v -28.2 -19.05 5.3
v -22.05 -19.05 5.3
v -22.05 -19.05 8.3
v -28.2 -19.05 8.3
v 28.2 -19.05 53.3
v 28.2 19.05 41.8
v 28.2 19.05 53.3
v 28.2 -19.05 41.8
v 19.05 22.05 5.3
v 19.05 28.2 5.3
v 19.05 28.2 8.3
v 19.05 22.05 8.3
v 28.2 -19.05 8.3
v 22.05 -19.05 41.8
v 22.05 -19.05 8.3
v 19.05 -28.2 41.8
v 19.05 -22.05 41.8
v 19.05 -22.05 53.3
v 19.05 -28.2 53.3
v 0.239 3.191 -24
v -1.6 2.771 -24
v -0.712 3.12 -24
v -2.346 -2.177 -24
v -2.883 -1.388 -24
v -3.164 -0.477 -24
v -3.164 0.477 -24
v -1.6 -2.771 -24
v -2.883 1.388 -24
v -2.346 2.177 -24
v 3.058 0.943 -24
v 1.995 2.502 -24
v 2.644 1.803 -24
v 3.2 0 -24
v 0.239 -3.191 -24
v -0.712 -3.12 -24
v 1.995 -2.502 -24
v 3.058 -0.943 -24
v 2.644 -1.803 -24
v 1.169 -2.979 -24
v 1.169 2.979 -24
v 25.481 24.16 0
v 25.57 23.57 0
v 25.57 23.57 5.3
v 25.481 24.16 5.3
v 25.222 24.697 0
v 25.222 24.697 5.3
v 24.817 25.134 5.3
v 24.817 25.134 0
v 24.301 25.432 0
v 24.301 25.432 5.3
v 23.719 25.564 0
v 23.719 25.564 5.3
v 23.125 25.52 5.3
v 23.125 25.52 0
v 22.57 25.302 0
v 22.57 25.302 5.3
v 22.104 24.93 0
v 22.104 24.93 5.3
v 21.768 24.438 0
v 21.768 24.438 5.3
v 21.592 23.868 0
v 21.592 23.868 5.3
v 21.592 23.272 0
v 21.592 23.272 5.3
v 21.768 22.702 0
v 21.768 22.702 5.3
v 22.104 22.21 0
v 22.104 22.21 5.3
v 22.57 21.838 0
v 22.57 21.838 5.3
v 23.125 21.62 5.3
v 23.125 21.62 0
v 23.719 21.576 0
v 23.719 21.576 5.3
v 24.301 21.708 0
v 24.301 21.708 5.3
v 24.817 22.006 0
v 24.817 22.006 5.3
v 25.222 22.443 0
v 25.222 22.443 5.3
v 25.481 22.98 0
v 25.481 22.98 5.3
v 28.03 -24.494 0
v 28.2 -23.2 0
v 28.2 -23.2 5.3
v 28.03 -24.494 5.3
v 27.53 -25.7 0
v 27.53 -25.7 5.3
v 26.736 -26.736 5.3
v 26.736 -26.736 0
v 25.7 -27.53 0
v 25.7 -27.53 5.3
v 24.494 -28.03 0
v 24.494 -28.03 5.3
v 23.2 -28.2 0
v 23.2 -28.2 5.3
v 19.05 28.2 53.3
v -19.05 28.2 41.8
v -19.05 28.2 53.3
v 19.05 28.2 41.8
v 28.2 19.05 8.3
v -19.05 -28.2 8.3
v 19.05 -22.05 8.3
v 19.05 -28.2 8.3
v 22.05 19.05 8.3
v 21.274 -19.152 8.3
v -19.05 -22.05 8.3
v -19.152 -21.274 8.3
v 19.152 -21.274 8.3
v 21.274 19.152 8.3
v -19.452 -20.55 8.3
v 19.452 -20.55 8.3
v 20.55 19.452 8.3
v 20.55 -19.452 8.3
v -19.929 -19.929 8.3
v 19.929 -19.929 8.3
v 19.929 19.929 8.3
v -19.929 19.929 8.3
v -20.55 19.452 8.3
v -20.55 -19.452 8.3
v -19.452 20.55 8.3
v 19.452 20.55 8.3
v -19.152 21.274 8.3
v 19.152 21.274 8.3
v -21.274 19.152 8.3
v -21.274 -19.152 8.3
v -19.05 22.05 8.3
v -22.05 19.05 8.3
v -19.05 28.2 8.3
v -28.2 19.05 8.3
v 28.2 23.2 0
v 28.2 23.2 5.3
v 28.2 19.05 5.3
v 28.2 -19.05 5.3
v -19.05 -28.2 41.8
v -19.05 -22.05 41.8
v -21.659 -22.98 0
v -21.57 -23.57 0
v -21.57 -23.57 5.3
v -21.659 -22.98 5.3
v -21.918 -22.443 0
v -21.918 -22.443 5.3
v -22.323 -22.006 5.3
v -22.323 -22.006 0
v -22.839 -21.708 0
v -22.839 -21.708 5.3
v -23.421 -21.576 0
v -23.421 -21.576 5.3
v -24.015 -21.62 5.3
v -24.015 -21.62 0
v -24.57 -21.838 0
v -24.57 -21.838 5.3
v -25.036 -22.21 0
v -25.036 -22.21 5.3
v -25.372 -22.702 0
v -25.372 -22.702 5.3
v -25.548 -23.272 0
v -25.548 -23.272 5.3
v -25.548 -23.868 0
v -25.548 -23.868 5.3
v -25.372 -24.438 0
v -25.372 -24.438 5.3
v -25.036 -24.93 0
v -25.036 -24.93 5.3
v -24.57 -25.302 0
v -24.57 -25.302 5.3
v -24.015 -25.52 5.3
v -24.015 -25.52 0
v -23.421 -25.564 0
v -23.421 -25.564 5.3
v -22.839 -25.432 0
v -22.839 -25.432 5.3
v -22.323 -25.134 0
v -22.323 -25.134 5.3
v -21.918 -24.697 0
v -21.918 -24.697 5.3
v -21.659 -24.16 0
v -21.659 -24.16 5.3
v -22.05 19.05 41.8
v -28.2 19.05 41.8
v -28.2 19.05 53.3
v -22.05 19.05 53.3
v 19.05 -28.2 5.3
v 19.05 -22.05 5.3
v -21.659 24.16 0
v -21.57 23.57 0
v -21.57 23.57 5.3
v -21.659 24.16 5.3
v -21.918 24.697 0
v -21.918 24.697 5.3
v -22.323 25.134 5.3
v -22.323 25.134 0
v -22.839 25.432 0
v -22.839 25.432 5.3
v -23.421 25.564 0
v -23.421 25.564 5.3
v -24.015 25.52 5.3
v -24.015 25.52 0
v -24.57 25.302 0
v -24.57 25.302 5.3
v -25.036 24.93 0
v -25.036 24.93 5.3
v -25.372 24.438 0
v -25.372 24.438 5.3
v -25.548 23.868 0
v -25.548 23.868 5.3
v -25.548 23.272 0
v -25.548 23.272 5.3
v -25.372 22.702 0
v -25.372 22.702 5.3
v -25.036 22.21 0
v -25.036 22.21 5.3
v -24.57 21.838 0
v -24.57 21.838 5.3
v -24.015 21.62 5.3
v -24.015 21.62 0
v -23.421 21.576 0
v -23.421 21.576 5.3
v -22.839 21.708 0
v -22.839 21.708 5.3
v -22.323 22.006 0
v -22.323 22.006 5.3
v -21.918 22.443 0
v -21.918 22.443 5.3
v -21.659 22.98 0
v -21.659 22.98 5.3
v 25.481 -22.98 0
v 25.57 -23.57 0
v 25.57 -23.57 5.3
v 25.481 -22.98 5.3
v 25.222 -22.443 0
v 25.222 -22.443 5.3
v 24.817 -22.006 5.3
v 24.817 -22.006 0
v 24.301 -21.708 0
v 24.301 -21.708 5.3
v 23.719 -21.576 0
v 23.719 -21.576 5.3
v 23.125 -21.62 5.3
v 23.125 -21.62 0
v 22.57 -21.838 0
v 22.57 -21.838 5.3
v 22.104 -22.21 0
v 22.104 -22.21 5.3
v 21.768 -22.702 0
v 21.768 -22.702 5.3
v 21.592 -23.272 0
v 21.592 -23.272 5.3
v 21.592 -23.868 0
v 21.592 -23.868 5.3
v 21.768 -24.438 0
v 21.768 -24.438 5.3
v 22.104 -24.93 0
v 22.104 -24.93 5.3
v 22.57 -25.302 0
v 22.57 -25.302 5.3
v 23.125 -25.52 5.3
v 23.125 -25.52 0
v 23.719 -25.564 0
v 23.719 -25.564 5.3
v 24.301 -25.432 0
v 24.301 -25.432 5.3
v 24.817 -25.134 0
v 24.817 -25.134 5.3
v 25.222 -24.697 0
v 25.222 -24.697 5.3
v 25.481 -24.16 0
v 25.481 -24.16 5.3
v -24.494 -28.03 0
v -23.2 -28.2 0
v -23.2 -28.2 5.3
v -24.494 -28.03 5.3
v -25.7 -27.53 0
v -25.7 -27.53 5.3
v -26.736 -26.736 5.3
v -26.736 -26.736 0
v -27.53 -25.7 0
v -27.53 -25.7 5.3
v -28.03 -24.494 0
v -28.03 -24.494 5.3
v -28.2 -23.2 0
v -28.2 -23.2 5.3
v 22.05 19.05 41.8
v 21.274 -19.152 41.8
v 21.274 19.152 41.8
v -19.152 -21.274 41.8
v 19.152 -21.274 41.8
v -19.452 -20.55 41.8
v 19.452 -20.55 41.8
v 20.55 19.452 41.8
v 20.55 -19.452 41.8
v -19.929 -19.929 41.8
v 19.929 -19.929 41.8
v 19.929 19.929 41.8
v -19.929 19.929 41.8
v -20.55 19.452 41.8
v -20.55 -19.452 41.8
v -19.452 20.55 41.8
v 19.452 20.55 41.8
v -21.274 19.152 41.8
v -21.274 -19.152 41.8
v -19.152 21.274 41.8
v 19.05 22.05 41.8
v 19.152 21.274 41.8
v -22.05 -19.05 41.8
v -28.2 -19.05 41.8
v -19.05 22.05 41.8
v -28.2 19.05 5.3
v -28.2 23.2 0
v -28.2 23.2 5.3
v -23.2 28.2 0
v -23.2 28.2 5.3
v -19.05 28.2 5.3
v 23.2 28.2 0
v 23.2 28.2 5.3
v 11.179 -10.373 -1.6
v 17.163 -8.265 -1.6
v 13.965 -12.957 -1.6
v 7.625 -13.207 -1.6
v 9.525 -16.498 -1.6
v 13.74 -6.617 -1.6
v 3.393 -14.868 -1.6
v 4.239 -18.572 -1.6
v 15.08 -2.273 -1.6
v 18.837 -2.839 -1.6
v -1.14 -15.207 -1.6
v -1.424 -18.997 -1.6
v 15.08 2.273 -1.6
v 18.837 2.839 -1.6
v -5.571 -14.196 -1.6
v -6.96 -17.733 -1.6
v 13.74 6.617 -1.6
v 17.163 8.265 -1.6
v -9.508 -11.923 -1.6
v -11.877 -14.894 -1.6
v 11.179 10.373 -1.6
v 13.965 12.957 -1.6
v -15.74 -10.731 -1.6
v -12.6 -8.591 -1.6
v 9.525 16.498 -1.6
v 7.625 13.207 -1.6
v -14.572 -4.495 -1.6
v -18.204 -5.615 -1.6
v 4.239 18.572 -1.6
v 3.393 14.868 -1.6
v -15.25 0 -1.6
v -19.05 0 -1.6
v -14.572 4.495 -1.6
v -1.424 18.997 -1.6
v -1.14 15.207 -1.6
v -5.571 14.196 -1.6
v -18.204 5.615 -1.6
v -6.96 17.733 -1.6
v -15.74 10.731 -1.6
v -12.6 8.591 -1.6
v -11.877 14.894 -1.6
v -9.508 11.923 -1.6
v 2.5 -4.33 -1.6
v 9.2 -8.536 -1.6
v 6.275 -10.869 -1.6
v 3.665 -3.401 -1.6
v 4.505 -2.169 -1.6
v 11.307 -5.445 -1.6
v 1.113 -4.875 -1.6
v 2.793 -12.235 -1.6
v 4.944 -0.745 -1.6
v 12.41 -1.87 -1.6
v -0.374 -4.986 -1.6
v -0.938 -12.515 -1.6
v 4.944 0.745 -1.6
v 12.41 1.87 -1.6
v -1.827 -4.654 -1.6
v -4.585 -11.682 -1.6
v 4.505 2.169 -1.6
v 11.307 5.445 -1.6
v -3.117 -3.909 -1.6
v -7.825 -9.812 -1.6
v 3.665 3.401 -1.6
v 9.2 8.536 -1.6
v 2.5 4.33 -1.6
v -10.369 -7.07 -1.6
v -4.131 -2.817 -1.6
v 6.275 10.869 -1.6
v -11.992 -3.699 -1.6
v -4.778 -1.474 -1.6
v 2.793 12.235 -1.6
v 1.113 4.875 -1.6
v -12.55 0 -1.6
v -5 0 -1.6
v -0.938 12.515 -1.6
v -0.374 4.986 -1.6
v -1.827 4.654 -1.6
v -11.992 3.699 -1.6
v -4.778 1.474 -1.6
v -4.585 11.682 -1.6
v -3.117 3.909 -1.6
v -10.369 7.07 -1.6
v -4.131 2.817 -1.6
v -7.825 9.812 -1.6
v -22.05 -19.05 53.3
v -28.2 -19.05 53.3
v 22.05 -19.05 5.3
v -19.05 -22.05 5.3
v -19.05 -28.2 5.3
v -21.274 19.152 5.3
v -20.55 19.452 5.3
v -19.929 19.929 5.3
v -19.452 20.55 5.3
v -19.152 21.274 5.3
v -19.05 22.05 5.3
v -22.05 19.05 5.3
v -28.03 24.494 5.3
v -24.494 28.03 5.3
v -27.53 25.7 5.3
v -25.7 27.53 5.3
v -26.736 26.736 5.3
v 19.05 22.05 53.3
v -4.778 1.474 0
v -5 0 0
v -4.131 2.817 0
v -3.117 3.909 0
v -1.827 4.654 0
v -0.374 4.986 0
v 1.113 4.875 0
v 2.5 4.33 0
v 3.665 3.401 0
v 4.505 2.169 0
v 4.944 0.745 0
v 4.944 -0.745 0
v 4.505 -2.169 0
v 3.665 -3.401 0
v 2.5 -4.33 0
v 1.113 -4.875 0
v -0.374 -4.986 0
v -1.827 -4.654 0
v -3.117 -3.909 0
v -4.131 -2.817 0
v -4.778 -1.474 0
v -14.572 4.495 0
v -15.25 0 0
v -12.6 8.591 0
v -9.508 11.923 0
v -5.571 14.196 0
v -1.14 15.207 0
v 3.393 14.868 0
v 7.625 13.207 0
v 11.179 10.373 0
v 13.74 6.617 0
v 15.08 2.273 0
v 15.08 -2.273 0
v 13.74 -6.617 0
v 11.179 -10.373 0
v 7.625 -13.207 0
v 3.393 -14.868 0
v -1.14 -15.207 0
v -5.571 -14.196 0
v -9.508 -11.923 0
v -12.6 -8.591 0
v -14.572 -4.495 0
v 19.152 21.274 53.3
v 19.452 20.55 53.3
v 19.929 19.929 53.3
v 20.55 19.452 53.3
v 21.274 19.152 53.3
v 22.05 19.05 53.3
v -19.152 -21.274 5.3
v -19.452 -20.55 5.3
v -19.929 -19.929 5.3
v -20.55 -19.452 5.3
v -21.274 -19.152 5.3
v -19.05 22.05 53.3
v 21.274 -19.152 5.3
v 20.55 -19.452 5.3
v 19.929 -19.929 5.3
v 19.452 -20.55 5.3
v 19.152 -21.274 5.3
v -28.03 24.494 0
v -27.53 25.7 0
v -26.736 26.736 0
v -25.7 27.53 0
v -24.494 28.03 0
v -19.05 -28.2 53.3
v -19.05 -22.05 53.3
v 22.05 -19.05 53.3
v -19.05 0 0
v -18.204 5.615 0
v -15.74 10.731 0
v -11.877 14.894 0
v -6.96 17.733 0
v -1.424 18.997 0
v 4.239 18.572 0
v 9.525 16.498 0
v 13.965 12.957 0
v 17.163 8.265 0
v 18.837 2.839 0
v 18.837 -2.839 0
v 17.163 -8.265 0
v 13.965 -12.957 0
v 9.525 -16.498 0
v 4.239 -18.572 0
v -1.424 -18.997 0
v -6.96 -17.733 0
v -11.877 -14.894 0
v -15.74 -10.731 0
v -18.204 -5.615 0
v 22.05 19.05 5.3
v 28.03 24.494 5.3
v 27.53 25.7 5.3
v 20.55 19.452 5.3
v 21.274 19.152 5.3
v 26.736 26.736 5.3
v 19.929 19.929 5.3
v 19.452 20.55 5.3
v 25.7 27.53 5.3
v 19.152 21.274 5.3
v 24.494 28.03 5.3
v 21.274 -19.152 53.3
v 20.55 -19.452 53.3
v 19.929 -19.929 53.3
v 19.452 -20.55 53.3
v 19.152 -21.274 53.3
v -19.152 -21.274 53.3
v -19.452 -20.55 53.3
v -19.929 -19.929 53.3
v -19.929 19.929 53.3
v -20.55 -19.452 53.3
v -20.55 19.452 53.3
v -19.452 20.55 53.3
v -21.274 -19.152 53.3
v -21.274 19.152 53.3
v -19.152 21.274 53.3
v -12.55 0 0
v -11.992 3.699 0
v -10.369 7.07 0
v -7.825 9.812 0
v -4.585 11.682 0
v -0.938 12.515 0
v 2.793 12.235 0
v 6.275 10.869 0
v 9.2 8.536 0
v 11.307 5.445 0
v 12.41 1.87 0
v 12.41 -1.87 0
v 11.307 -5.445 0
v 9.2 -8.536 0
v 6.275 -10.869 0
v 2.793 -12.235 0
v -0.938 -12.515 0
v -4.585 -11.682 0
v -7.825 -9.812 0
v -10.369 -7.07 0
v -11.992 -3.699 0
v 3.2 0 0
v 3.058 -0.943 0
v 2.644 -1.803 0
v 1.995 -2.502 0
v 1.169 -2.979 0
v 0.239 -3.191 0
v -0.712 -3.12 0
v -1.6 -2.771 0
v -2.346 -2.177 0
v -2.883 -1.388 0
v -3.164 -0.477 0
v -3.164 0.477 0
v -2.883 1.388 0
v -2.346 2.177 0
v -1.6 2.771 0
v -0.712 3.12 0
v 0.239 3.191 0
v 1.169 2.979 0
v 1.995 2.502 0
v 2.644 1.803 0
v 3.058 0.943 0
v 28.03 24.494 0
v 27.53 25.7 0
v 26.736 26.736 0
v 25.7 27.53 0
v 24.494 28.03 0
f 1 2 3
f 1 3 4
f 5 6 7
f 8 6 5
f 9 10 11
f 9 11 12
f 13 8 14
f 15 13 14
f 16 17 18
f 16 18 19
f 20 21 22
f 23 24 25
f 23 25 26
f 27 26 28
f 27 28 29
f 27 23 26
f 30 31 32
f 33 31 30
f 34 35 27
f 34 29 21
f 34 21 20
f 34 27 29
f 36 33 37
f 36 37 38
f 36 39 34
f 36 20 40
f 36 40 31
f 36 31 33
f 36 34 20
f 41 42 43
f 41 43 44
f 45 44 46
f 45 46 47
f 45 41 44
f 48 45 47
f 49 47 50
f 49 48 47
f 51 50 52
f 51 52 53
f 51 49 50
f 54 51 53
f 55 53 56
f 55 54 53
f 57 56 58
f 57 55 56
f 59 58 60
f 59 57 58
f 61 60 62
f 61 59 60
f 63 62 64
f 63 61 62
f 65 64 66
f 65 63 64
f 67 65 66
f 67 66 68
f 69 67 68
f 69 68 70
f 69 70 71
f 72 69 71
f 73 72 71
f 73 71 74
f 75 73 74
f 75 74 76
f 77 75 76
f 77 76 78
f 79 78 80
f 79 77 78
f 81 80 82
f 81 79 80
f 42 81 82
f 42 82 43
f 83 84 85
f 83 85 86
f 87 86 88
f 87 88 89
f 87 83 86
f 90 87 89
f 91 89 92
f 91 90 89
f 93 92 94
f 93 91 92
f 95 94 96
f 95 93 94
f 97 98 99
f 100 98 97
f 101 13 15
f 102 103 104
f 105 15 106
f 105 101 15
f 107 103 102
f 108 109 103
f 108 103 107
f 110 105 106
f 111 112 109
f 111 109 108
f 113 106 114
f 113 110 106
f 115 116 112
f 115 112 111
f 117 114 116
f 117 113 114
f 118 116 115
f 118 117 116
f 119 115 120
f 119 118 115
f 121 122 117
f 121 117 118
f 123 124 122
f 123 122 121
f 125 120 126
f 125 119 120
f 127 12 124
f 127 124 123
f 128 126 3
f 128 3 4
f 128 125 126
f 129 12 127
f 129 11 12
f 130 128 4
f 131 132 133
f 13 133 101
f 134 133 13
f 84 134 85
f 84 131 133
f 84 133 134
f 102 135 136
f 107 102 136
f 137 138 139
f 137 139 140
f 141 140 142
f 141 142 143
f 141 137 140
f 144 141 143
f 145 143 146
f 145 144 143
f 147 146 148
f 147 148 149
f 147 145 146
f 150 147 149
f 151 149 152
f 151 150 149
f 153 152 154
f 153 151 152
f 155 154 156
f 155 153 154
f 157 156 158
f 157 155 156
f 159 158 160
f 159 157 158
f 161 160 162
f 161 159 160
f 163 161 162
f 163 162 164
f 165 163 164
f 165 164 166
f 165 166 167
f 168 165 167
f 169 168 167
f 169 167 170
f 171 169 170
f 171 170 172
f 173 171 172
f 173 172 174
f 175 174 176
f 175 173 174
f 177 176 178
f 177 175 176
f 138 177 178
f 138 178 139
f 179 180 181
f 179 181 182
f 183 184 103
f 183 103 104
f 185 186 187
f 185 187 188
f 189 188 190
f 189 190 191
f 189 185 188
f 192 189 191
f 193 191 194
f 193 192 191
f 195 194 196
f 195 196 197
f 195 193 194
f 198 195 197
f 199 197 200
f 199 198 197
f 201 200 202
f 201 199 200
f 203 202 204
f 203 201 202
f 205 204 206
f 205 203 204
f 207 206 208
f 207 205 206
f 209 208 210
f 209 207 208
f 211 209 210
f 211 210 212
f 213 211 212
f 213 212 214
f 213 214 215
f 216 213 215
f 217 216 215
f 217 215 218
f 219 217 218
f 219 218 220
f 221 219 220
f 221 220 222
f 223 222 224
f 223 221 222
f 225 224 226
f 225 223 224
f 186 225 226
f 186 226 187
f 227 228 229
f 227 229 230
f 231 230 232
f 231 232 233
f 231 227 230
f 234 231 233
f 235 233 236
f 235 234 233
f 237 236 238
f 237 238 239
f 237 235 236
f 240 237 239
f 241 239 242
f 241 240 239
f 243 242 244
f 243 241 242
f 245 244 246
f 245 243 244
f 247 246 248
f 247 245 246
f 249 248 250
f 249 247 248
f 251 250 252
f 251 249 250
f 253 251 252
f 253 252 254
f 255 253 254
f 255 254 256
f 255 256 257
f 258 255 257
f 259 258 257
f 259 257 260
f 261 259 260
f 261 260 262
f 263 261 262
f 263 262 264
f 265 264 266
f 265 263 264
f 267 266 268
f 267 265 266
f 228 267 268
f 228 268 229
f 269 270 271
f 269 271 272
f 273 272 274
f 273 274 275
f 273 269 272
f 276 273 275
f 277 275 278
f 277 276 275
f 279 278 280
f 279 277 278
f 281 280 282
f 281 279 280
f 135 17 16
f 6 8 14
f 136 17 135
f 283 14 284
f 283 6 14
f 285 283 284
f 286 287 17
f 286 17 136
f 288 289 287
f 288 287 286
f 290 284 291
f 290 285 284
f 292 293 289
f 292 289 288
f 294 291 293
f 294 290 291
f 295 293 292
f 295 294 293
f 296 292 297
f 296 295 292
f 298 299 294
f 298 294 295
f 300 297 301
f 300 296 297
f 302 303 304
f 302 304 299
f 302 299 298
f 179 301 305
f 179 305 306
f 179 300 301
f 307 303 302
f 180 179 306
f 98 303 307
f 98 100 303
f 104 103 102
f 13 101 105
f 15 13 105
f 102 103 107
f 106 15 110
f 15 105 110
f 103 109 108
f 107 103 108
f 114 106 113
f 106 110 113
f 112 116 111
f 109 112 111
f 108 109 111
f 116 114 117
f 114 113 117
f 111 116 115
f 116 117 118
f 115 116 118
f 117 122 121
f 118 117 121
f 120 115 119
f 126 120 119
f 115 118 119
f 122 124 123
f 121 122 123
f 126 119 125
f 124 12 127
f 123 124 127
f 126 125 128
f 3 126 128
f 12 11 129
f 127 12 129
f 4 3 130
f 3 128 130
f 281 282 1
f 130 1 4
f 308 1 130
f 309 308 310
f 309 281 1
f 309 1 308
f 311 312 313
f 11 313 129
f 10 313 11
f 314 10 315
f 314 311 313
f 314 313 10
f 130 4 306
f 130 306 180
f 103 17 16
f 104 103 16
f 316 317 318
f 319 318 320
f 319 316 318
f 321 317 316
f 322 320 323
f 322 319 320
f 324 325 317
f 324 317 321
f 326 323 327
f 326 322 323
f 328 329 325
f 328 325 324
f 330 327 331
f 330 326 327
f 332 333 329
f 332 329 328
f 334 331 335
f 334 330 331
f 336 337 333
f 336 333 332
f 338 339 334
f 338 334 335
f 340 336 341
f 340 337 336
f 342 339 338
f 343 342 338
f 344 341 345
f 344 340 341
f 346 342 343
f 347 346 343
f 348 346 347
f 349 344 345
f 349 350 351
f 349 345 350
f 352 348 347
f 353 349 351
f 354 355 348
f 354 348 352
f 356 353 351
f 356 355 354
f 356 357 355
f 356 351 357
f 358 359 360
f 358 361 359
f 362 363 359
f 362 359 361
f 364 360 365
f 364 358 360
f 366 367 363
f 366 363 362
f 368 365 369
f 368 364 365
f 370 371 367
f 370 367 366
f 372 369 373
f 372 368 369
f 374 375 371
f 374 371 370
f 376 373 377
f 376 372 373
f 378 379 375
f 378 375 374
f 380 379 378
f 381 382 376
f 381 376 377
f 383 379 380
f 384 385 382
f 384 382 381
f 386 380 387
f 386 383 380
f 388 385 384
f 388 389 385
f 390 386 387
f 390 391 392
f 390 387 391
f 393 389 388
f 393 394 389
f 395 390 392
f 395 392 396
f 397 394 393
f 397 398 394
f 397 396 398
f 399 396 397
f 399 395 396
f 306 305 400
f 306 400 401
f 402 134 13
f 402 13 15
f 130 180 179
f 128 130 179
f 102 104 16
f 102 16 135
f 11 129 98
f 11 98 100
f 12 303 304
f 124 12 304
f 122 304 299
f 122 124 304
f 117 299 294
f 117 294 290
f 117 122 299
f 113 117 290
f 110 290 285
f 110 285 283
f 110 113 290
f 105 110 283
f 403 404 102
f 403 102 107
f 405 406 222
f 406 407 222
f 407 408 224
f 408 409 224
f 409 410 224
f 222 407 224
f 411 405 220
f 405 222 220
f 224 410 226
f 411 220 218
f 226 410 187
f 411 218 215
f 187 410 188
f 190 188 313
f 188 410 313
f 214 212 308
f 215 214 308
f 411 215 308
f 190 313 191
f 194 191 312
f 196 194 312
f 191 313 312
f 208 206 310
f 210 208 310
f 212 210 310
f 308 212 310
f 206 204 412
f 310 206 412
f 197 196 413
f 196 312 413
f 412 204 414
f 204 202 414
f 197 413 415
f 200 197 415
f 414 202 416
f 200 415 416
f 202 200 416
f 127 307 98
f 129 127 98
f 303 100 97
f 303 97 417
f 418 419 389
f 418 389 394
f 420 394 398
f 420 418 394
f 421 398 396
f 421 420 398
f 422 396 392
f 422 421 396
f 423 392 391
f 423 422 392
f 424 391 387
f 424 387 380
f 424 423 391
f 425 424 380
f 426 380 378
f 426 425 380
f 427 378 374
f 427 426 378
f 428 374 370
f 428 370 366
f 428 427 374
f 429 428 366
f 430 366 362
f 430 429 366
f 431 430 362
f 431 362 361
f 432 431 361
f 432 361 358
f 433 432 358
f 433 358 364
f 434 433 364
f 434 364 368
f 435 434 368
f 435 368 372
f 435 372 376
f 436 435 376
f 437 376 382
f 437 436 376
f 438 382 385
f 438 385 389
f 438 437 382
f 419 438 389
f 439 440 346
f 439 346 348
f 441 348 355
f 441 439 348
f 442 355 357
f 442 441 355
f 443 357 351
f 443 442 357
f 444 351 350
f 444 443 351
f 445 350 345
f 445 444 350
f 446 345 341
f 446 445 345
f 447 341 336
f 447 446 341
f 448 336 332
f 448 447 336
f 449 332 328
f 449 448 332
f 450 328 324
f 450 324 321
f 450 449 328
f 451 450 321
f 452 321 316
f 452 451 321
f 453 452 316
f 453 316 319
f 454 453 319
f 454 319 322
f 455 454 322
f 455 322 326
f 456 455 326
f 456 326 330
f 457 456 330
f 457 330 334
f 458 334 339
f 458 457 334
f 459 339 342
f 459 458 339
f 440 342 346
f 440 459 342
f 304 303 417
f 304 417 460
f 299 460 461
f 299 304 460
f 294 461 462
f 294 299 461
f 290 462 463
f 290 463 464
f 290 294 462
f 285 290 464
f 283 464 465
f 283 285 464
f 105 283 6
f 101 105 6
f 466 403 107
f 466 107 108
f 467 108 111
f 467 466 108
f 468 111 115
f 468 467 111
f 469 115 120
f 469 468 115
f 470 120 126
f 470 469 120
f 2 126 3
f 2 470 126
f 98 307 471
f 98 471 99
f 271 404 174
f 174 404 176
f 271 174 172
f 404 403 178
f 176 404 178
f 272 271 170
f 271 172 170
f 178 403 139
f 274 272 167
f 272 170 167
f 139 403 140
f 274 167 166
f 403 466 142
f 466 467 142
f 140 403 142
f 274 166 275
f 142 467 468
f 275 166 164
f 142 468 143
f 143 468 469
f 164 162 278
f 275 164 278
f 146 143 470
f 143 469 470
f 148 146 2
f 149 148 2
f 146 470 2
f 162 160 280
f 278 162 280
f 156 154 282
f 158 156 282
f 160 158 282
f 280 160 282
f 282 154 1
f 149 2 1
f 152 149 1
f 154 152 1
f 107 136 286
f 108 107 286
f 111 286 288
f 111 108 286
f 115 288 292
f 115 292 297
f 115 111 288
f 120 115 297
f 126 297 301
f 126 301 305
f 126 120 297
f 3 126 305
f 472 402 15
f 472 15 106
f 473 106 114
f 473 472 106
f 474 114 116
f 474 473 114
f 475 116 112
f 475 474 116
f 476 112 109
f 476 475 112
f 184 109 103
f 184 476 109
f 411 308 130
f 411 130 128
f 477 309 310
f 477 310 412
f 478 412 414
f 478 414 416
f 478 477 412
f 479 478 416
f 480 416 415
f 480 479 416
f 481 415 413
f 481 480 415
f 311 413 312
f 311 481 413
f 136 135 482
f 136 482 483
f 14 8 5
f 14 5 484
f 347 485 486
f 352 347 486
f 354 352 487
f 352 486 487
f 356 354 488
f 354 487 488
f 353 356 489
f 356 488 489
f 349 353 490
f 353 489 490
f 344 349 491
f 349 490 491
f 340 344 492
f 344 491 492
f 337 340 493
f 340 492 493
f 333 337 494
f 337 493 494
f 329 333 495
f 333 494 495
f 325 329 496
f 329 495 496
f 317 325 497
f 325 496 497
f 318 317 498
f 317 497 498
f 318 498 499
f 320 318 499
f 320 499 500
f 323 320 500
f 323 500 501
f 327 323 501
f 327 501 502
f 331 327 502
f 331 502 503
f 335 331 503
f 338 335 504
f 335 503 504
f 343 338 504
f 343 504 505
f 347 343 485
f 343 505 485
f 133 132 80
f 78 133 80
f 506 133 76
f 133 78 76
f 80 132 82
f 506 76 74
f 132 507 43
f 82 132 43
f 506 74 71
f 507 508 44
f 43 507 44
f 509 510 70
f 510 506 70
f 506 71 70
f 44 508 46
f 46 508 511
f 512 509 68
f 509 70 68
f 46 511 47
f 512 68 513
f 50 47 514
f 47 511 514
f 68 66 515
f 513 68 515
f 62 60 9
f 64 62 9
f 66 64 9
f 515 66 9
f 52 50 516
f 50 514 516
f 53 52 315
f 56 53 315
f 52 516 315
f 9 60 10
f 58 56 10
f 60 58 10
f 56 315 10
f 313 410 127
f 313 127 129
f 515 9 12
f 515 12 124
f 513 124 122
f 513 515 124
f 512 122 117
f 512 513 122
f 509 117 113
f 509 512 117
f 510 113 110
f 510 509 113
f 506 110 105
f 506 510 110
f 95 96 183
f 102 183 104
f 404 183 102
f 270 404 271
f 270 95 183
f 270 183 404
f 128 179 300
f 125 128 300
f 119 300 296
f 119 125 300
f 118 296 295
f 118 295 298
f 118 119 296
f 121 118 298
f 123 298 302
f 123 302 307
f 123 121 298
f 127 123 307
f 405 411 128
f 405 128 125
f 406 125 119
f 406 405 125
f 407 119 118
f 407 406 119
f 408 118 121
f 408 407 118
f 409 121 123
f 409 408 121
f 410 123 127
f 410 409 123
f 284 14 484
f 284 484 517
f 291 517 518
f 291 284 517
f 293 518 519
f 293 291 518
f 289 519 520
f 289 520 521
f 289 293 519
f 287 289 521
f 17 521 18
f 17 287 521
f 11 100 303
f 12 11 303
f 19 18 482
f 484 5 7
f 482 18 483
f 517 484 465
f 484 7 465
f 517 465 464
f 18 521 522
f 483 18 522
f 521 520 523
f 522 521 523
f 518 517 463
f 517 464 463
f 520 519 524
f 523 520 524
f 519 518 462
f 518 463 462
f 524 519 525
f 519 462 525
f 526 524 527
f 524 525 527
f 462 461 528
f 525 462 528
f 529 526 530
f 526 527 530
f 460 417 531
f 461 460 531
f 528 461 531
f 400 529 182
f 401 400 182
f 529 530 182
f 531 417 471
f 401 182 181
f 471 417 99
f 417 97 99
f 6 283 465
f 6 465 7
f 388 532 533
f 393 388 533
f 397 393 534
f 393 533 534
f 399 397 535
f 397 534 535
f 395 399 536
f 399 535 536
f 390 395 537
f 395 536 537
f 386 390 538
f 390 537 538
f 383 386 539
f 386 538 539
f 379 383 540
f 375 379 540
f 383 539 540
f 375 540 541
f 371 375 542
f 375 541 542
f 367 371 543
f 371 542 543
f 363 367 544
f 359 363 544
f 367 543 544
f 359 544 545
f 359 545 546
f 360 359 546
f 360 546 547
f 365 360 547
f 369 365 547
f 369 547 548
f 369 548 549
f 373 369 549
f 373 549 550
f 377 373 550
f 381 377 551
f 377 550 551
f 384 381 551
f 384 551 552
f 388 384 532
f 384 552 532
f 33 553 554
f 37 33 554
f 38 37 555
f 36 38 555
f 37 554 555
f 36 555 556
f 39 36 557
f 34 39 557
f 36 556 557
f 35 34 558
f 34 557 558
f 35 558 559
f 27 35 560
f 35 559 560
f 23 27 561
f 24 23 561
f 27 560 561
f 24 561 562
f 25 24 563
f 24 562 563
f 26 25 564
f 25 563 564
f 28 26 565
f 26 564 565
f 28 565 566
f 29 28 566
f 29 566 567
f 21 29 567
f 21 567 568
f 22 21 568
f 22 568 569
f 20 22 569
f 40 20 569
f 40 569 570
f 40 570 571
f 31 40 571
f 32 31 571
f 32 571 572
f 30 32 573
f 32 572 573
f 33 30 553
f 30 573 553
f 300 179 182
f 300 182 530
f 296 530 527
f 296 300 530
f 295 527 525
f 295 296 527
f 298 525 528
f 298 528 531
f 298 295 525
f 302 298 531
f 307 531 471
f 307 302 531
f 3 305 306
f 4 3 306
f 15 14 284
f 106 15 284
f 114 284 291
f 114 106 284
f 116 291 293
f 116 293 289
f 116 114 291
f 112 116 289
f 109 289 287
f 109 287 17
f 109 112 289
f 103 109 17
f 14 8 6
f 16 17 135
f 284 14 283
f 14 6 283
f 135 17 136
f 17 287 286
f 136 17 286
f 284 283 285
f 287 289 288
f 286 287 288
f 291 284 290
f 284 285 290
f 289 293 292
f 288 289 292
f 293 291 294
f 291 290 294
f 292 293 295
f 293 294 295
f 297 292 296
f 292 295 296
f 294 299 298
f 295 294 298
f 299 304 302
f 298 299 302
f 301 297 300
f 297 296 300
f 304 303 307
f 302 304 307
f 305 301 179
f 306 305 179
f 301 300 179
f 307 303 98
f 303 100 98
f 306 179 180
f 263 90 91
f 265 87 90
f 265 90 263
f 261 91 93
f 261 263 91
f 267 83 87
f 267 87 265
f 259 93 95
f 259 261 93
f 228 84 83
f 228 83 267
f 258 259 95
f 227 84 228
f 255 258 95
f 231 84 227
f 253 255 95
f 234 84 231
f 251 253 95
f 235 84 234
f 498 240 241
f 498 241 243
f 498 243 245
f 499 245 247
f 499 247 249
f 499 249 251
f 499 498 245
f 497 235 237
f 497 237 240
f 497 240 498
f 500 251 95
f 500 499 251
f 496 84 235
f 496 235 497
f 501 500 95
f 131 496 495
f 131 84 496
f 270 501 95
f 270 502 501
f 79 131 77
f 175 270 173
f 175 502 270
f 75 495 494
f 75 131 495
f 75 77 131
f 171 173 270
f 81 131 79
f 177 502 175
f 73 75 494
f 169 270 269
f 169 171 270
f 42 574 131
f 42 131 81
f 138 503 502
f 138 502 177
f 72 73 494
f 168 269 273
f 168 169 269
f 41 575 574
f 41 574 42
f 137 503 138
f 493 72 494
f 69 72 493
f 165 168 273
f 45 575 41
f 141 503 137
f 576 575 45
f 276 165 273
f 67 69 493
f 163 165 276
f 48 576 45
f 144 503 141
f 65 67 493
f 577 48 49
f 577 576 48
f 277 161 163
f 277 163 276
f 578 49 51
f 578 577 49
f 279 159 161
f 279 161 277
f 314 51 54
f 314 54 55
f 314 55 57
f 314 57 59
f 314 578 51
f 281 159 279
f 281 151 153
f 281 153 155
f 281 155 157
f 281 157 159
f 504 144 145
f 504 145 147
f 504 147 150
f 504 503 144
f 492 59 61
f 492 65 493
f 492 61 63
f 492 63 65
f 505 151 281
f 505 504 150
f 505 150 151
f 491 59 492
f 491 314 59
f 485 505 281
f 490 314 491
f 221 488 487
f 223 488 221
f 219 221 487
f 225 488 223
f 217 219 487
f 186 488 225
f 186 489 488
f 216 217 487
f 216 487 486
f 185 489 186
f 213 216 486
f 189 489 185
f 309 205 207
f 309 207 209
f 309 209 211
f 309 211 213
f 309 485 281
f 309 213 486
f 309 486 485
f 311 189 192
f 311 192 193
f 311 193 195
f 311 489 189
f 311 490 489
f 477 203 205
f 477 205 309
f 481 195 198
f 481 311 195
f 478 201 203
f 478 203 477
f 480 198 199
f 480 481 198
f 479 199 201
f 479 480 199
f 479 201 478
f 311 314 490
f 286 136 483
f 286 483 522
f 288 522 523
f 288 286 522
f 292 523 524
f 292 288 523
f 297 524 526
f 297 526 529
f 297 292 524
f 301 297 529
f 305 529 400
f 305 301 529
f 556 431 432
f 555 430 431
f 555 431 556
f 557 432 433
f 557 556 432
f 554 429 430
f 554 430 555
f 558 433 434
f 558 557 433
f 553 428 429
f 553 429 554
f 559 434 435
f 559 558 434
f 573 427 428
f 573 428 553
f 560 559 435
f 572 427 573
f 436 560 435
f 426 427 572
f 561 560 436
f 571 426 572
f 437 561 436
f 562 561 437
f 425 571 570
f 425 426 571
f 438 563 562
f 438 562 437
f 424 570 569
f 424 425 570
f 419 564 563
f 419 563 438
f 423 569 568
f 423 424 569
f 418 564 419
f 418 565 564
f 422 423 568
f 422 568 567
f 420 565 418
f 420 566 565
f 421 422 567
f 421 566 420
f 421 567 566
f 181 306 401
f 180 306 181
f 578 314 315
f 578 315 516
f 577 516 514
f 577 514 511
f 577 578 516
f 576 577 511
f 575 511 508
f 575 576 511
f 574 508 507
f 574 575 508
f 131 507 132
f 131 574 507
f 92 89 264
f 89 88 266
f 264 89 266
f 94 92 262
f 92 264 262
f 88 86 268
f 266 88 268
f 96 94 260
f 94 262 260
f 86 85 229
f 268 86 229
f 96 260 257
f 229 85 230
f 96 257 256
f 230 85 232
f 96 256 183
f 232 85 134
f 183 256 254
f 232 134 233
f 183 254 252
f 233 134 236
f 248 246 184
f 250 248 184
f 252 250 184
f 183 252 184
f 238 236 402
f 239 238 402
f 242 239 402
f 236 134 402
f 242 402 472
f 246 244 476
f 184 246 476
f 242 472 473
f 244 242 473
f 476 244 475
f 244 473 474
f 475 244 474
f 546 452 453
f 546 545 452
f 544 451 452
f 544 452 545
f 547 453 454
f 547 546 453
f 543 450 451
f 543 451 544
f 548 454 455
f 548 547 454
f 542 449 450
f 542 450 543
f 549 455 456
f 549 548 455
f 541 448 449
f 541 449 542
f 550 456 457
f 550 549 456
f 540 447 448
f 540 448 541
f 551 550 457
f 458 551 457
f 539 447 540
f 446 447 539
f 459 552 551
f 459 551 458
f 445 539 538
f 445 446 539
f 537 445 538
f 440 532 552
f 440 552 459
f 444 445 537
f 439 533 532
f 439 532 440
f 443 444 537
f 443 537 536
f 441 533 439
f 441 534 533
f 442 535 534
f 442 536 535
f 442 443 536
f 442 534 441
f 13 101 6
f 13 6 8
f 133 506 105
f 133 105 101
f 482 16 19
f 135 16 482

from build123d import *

# Parameters (mm, degrees)
CROQUIS1_R                = 2
SALIENTE_EXTRUIR1_DEPTH   = 5.3
SALIENTE_EXTRUIR2_DEPTH   = 3
SALIENTE_EXTRUIR4_DEPTH   = 33.5
SALIENTE_EXTRUIR7_DEPTH   = 11.5
CROQUIS7_R                = 19.05
CROQUIS7_R_2              = 15.25
SALIENTE_EXTRUIR9_DEPTH   = 1.6
CROQUIS7_R_3              = 12.55
CROQUIS7_R_4              = 5
SALIENTE_EXTRUIR9_2_DEPTH = 1.6
CROQUIS8_R                = 3.2
SALIENTE_EXTRUIR10_DEPTH  = 24


with BuildPart() as part:
    # Croquis1 → Saliente-Extruir1 (new body)
    with BuildSketch(Plane.XY):
        with BuildLine():
            Line((23.2, -28.2), (-23.2, -28.2))
            ThreePointArc((-23.2, -28.2), (-26.735533906, -26.735533906), (-28.2, -23.2))
            Line((-28.2, -23.2), (-28.2, 23.2))
            ThreePointArc((-28.2, 23.2), (-26.735533906, 26.735533906), (-23.2, 28.2))
            Line((-23.2, 28.2), (23.2, 28.2))
            ThreePointArc((23.2, 28.2), (26.735533906, 26.735533906), (28.2, 23.2))
            Line((28.2, 23.2), (28.2, -23.2))
            ThreePointArc((28.2, -23.2), (26.735533906, -26.735533906), (23.2, -28.2))
        make_face()
        with Locations((-23.57, -23.57)):
            Circle(CROQUIS1_R, mode=Mode.SUBTRACT)
        with Locations((23.57, -23.57)):
            Circle(CROQUIS1_R, mode=Mode.SUBTRACT)
        with Locations((-23.57, 23.57)):
            Circle(CROQUIS1_R, mode=Mode.SUBTRACT)
        with Locations((23.57, 23.57)):
            Circle(CROQUIS1_R, mode=Mode.SUBTRACT)
    extrude(amount=SALIENTE_EXTRUIR1_DEPTH)

    # Croquis2 → Saliente-Extruir2 (add)
    with BuildSketch(Plane.XY.offset(5.3)):
        with BuildLine():
            Line((-19.05, 22.05), (-19.05, 28.2))
            Line((-19.05, 28.2), (19.05, 28.2))
            Line((19.05, 28.2), (19.05, 22.05))
            ThreePointArc((19.05, 22.05), (19.928679656, 19.928679656), (22.05, 19.05))
            Line((22.05, 19.05), (28.2, 19.05))
            Line((28.2, 19.05), (28.2, -19.05))
            Line((28.2, -19.05), (22.05, -19.05))
            ThreePointArc((22.05, -19.05), (19.928679656, -19.928679656), (19.05, -22.05))
            Line((19.05, -22.05), (19.05, -28.2))
            Line((19.05, -28.2), (-19.05, -28.2))
            Line((-19.05, -28.2), (-19.05, -22.05))
            ThreePointArc((-19.05, -22.05), (-19.928679656, -19.928679656), (-22.05, -19.05))
            Line((-22.05, -19.05), (-28.2, -19.05))
            Line((-28.2, -19.05), (-28.2, 19.05))
            Line((-28.2, 19.05), (-22.05, 19.05))
            ThreePointArc((-22.05, 19.05), (-19.928679656, 19.928679656), (-19.05, 22.05))
        make_face()
    extrude(amount=SALIENTE_EXTRUIR2_DEPTH)



with BuildPart() as body_2:
    # Croquis3 → Saliente-Extruir4 (new body)
    with BuildSketch(Plane.XY.offset(8.3)):
        with BuildLine():
            Line((-19.05, 28.2), (19.05, 28.2))
            Line((19.05, 28.2), (19.05, 22.05))
            ThreePointArc((19.05, 22.05), (19.928679656, 19.928679656), (22.05, 19.05))
            Line((22.05, 19.05), (28.2, 19.05))
            Line((28.2, 19.05), (28.2, -19.05))
            Line((28.2, -19.05), (22.05, -19.05))
            ThreePointArc((22.05, -19.05), (19.928679656, -19.928679656), (19.05, -22.05))
            Line((19.05, -22.05), (19.05, -28.2))
            Line((19.05, -28.2), (-19.05, -28.2))
            Line((-19.05, -28.2), (-19.05, -22.05))
            ThreePointArc((-19.05, -22.05), (-19.928679656, -19.928679656), (-22.05, -19.05))
            Line((-22.05, -19.05), (-28.2, -19.05))
            Line((-28.2, -19.05), (-28.2, 19.05))
            Line((-28.2, 19.05), (-22.05, 19.05))
            ThreePointArc((-22.05, 19.05), (-19.928679656, 19.928679656), (-19.05, 22.05))
            Line((-19.05, 22.05), (-19.05, 28.2))
        make_face()
    extrude(amount=SALIENTE_EXTRUIR4_DEPTH)


with BuildPart() as body_3:
    # Croquis5 → Saliente-Extruir7 (new body)
    with BuildSketch(Plane.XY.offset(41.8)):
        with BuildLine():
            Line((22.05, 19.05), (28.2, 19.05))
            Line((28.2, 19.05), (28.2, -19.05))
            Line((28.2, -19.05), (22.05, -19.05))
            ThreePointArc((22.05, -19.05), (19.928679656, -19.928679656), (19.05, -22.05))
            Line((19.05, -22.05), (19.05, -28.2))
            Line((19.05, -28.2), (-19.05, -28.2))
            Line((-19.05, -28.2), (-19.05, -22.05))
            ThreePointArc((-19.05, -22.05), (-19.928679656, -19.928679656), (-22.05, -19.05))
            Line((-22.05, -19.05), (-28.2, -19.05))
            Line((-28.2, -19.05), (-28.2, 19.05))
            Line((-28.2, 19.05), (-22.05, 19.05))
            ThreePointArc((-22.05, 19.05), (-19.928679656, 19.928679656), (-19.05, 22.05))
            Line((-19.05, 22.05), (-19.05, 28.2))
            Line((-19.05, 28.2), (19.05, 28.2))
            Line((19.05, 28.2), (19.05, 22.05))
            ThreePointArc((19.05, 22.05), (19.928679656, 19.928679656), (22.05, 19.05))
        make_face()
    extrude(amount=SALIENTE_EXTRUIR7_DEPTH)


with BuildPart() as body_4:
    # Croquis7 → Saliente-Extruir9 (new body)
    with BuildSketch(Plane(origin=(0, 0, 0), x_dir=(-1, 0, 0), z_dir=(0, 0, -1))):
        Circle(CROQUIS7_R)
        Circle(CROQUIS7_R_2, mode=Mode.SUBTRACT)
    extrude(amount=SALIENTE_EXTRUIR9_DEPTH)


with BuildPart() as body_5:
    # Croquis7 → Saliente-Extruir9 2 (new body)
    with BuildSketch(Plane(origin=(0, 0, 0), x_dir=(-1, 0, 0), z_dir=(0, 0, -1))):
        Circle(CROQUIS7_R_3)
        Circle(CROQUIS7_R_4, mode=Mode.SUBTRACT)
    extrude(amount=SALIENTE_EXTRUIR9_2_DEPTH)


with BuildPart() as part_1:
    add(part.part)

    add(body_4.part)  # Saliente-Extruir10 merges body 4

    add(body_5.part)  # Saliente-Extruir10 merges body 5
    # Croquis8 → Saliente-Extruir10 (add)
    with BuildSketch(Plane(origin=(0, 0, 0), x_dir=(-1, 0, 0), z_dir=(0, 0, -1))):
        with Locations(Location((0, 0, 0), (0, 0, 180))):
            Circle(CROQUIS8_R)
    extrude(amount=SALIENTE_EXTRUIR10_DEPTH)


solid = Compound([body_2.part, body_3.part, part_1.part])
